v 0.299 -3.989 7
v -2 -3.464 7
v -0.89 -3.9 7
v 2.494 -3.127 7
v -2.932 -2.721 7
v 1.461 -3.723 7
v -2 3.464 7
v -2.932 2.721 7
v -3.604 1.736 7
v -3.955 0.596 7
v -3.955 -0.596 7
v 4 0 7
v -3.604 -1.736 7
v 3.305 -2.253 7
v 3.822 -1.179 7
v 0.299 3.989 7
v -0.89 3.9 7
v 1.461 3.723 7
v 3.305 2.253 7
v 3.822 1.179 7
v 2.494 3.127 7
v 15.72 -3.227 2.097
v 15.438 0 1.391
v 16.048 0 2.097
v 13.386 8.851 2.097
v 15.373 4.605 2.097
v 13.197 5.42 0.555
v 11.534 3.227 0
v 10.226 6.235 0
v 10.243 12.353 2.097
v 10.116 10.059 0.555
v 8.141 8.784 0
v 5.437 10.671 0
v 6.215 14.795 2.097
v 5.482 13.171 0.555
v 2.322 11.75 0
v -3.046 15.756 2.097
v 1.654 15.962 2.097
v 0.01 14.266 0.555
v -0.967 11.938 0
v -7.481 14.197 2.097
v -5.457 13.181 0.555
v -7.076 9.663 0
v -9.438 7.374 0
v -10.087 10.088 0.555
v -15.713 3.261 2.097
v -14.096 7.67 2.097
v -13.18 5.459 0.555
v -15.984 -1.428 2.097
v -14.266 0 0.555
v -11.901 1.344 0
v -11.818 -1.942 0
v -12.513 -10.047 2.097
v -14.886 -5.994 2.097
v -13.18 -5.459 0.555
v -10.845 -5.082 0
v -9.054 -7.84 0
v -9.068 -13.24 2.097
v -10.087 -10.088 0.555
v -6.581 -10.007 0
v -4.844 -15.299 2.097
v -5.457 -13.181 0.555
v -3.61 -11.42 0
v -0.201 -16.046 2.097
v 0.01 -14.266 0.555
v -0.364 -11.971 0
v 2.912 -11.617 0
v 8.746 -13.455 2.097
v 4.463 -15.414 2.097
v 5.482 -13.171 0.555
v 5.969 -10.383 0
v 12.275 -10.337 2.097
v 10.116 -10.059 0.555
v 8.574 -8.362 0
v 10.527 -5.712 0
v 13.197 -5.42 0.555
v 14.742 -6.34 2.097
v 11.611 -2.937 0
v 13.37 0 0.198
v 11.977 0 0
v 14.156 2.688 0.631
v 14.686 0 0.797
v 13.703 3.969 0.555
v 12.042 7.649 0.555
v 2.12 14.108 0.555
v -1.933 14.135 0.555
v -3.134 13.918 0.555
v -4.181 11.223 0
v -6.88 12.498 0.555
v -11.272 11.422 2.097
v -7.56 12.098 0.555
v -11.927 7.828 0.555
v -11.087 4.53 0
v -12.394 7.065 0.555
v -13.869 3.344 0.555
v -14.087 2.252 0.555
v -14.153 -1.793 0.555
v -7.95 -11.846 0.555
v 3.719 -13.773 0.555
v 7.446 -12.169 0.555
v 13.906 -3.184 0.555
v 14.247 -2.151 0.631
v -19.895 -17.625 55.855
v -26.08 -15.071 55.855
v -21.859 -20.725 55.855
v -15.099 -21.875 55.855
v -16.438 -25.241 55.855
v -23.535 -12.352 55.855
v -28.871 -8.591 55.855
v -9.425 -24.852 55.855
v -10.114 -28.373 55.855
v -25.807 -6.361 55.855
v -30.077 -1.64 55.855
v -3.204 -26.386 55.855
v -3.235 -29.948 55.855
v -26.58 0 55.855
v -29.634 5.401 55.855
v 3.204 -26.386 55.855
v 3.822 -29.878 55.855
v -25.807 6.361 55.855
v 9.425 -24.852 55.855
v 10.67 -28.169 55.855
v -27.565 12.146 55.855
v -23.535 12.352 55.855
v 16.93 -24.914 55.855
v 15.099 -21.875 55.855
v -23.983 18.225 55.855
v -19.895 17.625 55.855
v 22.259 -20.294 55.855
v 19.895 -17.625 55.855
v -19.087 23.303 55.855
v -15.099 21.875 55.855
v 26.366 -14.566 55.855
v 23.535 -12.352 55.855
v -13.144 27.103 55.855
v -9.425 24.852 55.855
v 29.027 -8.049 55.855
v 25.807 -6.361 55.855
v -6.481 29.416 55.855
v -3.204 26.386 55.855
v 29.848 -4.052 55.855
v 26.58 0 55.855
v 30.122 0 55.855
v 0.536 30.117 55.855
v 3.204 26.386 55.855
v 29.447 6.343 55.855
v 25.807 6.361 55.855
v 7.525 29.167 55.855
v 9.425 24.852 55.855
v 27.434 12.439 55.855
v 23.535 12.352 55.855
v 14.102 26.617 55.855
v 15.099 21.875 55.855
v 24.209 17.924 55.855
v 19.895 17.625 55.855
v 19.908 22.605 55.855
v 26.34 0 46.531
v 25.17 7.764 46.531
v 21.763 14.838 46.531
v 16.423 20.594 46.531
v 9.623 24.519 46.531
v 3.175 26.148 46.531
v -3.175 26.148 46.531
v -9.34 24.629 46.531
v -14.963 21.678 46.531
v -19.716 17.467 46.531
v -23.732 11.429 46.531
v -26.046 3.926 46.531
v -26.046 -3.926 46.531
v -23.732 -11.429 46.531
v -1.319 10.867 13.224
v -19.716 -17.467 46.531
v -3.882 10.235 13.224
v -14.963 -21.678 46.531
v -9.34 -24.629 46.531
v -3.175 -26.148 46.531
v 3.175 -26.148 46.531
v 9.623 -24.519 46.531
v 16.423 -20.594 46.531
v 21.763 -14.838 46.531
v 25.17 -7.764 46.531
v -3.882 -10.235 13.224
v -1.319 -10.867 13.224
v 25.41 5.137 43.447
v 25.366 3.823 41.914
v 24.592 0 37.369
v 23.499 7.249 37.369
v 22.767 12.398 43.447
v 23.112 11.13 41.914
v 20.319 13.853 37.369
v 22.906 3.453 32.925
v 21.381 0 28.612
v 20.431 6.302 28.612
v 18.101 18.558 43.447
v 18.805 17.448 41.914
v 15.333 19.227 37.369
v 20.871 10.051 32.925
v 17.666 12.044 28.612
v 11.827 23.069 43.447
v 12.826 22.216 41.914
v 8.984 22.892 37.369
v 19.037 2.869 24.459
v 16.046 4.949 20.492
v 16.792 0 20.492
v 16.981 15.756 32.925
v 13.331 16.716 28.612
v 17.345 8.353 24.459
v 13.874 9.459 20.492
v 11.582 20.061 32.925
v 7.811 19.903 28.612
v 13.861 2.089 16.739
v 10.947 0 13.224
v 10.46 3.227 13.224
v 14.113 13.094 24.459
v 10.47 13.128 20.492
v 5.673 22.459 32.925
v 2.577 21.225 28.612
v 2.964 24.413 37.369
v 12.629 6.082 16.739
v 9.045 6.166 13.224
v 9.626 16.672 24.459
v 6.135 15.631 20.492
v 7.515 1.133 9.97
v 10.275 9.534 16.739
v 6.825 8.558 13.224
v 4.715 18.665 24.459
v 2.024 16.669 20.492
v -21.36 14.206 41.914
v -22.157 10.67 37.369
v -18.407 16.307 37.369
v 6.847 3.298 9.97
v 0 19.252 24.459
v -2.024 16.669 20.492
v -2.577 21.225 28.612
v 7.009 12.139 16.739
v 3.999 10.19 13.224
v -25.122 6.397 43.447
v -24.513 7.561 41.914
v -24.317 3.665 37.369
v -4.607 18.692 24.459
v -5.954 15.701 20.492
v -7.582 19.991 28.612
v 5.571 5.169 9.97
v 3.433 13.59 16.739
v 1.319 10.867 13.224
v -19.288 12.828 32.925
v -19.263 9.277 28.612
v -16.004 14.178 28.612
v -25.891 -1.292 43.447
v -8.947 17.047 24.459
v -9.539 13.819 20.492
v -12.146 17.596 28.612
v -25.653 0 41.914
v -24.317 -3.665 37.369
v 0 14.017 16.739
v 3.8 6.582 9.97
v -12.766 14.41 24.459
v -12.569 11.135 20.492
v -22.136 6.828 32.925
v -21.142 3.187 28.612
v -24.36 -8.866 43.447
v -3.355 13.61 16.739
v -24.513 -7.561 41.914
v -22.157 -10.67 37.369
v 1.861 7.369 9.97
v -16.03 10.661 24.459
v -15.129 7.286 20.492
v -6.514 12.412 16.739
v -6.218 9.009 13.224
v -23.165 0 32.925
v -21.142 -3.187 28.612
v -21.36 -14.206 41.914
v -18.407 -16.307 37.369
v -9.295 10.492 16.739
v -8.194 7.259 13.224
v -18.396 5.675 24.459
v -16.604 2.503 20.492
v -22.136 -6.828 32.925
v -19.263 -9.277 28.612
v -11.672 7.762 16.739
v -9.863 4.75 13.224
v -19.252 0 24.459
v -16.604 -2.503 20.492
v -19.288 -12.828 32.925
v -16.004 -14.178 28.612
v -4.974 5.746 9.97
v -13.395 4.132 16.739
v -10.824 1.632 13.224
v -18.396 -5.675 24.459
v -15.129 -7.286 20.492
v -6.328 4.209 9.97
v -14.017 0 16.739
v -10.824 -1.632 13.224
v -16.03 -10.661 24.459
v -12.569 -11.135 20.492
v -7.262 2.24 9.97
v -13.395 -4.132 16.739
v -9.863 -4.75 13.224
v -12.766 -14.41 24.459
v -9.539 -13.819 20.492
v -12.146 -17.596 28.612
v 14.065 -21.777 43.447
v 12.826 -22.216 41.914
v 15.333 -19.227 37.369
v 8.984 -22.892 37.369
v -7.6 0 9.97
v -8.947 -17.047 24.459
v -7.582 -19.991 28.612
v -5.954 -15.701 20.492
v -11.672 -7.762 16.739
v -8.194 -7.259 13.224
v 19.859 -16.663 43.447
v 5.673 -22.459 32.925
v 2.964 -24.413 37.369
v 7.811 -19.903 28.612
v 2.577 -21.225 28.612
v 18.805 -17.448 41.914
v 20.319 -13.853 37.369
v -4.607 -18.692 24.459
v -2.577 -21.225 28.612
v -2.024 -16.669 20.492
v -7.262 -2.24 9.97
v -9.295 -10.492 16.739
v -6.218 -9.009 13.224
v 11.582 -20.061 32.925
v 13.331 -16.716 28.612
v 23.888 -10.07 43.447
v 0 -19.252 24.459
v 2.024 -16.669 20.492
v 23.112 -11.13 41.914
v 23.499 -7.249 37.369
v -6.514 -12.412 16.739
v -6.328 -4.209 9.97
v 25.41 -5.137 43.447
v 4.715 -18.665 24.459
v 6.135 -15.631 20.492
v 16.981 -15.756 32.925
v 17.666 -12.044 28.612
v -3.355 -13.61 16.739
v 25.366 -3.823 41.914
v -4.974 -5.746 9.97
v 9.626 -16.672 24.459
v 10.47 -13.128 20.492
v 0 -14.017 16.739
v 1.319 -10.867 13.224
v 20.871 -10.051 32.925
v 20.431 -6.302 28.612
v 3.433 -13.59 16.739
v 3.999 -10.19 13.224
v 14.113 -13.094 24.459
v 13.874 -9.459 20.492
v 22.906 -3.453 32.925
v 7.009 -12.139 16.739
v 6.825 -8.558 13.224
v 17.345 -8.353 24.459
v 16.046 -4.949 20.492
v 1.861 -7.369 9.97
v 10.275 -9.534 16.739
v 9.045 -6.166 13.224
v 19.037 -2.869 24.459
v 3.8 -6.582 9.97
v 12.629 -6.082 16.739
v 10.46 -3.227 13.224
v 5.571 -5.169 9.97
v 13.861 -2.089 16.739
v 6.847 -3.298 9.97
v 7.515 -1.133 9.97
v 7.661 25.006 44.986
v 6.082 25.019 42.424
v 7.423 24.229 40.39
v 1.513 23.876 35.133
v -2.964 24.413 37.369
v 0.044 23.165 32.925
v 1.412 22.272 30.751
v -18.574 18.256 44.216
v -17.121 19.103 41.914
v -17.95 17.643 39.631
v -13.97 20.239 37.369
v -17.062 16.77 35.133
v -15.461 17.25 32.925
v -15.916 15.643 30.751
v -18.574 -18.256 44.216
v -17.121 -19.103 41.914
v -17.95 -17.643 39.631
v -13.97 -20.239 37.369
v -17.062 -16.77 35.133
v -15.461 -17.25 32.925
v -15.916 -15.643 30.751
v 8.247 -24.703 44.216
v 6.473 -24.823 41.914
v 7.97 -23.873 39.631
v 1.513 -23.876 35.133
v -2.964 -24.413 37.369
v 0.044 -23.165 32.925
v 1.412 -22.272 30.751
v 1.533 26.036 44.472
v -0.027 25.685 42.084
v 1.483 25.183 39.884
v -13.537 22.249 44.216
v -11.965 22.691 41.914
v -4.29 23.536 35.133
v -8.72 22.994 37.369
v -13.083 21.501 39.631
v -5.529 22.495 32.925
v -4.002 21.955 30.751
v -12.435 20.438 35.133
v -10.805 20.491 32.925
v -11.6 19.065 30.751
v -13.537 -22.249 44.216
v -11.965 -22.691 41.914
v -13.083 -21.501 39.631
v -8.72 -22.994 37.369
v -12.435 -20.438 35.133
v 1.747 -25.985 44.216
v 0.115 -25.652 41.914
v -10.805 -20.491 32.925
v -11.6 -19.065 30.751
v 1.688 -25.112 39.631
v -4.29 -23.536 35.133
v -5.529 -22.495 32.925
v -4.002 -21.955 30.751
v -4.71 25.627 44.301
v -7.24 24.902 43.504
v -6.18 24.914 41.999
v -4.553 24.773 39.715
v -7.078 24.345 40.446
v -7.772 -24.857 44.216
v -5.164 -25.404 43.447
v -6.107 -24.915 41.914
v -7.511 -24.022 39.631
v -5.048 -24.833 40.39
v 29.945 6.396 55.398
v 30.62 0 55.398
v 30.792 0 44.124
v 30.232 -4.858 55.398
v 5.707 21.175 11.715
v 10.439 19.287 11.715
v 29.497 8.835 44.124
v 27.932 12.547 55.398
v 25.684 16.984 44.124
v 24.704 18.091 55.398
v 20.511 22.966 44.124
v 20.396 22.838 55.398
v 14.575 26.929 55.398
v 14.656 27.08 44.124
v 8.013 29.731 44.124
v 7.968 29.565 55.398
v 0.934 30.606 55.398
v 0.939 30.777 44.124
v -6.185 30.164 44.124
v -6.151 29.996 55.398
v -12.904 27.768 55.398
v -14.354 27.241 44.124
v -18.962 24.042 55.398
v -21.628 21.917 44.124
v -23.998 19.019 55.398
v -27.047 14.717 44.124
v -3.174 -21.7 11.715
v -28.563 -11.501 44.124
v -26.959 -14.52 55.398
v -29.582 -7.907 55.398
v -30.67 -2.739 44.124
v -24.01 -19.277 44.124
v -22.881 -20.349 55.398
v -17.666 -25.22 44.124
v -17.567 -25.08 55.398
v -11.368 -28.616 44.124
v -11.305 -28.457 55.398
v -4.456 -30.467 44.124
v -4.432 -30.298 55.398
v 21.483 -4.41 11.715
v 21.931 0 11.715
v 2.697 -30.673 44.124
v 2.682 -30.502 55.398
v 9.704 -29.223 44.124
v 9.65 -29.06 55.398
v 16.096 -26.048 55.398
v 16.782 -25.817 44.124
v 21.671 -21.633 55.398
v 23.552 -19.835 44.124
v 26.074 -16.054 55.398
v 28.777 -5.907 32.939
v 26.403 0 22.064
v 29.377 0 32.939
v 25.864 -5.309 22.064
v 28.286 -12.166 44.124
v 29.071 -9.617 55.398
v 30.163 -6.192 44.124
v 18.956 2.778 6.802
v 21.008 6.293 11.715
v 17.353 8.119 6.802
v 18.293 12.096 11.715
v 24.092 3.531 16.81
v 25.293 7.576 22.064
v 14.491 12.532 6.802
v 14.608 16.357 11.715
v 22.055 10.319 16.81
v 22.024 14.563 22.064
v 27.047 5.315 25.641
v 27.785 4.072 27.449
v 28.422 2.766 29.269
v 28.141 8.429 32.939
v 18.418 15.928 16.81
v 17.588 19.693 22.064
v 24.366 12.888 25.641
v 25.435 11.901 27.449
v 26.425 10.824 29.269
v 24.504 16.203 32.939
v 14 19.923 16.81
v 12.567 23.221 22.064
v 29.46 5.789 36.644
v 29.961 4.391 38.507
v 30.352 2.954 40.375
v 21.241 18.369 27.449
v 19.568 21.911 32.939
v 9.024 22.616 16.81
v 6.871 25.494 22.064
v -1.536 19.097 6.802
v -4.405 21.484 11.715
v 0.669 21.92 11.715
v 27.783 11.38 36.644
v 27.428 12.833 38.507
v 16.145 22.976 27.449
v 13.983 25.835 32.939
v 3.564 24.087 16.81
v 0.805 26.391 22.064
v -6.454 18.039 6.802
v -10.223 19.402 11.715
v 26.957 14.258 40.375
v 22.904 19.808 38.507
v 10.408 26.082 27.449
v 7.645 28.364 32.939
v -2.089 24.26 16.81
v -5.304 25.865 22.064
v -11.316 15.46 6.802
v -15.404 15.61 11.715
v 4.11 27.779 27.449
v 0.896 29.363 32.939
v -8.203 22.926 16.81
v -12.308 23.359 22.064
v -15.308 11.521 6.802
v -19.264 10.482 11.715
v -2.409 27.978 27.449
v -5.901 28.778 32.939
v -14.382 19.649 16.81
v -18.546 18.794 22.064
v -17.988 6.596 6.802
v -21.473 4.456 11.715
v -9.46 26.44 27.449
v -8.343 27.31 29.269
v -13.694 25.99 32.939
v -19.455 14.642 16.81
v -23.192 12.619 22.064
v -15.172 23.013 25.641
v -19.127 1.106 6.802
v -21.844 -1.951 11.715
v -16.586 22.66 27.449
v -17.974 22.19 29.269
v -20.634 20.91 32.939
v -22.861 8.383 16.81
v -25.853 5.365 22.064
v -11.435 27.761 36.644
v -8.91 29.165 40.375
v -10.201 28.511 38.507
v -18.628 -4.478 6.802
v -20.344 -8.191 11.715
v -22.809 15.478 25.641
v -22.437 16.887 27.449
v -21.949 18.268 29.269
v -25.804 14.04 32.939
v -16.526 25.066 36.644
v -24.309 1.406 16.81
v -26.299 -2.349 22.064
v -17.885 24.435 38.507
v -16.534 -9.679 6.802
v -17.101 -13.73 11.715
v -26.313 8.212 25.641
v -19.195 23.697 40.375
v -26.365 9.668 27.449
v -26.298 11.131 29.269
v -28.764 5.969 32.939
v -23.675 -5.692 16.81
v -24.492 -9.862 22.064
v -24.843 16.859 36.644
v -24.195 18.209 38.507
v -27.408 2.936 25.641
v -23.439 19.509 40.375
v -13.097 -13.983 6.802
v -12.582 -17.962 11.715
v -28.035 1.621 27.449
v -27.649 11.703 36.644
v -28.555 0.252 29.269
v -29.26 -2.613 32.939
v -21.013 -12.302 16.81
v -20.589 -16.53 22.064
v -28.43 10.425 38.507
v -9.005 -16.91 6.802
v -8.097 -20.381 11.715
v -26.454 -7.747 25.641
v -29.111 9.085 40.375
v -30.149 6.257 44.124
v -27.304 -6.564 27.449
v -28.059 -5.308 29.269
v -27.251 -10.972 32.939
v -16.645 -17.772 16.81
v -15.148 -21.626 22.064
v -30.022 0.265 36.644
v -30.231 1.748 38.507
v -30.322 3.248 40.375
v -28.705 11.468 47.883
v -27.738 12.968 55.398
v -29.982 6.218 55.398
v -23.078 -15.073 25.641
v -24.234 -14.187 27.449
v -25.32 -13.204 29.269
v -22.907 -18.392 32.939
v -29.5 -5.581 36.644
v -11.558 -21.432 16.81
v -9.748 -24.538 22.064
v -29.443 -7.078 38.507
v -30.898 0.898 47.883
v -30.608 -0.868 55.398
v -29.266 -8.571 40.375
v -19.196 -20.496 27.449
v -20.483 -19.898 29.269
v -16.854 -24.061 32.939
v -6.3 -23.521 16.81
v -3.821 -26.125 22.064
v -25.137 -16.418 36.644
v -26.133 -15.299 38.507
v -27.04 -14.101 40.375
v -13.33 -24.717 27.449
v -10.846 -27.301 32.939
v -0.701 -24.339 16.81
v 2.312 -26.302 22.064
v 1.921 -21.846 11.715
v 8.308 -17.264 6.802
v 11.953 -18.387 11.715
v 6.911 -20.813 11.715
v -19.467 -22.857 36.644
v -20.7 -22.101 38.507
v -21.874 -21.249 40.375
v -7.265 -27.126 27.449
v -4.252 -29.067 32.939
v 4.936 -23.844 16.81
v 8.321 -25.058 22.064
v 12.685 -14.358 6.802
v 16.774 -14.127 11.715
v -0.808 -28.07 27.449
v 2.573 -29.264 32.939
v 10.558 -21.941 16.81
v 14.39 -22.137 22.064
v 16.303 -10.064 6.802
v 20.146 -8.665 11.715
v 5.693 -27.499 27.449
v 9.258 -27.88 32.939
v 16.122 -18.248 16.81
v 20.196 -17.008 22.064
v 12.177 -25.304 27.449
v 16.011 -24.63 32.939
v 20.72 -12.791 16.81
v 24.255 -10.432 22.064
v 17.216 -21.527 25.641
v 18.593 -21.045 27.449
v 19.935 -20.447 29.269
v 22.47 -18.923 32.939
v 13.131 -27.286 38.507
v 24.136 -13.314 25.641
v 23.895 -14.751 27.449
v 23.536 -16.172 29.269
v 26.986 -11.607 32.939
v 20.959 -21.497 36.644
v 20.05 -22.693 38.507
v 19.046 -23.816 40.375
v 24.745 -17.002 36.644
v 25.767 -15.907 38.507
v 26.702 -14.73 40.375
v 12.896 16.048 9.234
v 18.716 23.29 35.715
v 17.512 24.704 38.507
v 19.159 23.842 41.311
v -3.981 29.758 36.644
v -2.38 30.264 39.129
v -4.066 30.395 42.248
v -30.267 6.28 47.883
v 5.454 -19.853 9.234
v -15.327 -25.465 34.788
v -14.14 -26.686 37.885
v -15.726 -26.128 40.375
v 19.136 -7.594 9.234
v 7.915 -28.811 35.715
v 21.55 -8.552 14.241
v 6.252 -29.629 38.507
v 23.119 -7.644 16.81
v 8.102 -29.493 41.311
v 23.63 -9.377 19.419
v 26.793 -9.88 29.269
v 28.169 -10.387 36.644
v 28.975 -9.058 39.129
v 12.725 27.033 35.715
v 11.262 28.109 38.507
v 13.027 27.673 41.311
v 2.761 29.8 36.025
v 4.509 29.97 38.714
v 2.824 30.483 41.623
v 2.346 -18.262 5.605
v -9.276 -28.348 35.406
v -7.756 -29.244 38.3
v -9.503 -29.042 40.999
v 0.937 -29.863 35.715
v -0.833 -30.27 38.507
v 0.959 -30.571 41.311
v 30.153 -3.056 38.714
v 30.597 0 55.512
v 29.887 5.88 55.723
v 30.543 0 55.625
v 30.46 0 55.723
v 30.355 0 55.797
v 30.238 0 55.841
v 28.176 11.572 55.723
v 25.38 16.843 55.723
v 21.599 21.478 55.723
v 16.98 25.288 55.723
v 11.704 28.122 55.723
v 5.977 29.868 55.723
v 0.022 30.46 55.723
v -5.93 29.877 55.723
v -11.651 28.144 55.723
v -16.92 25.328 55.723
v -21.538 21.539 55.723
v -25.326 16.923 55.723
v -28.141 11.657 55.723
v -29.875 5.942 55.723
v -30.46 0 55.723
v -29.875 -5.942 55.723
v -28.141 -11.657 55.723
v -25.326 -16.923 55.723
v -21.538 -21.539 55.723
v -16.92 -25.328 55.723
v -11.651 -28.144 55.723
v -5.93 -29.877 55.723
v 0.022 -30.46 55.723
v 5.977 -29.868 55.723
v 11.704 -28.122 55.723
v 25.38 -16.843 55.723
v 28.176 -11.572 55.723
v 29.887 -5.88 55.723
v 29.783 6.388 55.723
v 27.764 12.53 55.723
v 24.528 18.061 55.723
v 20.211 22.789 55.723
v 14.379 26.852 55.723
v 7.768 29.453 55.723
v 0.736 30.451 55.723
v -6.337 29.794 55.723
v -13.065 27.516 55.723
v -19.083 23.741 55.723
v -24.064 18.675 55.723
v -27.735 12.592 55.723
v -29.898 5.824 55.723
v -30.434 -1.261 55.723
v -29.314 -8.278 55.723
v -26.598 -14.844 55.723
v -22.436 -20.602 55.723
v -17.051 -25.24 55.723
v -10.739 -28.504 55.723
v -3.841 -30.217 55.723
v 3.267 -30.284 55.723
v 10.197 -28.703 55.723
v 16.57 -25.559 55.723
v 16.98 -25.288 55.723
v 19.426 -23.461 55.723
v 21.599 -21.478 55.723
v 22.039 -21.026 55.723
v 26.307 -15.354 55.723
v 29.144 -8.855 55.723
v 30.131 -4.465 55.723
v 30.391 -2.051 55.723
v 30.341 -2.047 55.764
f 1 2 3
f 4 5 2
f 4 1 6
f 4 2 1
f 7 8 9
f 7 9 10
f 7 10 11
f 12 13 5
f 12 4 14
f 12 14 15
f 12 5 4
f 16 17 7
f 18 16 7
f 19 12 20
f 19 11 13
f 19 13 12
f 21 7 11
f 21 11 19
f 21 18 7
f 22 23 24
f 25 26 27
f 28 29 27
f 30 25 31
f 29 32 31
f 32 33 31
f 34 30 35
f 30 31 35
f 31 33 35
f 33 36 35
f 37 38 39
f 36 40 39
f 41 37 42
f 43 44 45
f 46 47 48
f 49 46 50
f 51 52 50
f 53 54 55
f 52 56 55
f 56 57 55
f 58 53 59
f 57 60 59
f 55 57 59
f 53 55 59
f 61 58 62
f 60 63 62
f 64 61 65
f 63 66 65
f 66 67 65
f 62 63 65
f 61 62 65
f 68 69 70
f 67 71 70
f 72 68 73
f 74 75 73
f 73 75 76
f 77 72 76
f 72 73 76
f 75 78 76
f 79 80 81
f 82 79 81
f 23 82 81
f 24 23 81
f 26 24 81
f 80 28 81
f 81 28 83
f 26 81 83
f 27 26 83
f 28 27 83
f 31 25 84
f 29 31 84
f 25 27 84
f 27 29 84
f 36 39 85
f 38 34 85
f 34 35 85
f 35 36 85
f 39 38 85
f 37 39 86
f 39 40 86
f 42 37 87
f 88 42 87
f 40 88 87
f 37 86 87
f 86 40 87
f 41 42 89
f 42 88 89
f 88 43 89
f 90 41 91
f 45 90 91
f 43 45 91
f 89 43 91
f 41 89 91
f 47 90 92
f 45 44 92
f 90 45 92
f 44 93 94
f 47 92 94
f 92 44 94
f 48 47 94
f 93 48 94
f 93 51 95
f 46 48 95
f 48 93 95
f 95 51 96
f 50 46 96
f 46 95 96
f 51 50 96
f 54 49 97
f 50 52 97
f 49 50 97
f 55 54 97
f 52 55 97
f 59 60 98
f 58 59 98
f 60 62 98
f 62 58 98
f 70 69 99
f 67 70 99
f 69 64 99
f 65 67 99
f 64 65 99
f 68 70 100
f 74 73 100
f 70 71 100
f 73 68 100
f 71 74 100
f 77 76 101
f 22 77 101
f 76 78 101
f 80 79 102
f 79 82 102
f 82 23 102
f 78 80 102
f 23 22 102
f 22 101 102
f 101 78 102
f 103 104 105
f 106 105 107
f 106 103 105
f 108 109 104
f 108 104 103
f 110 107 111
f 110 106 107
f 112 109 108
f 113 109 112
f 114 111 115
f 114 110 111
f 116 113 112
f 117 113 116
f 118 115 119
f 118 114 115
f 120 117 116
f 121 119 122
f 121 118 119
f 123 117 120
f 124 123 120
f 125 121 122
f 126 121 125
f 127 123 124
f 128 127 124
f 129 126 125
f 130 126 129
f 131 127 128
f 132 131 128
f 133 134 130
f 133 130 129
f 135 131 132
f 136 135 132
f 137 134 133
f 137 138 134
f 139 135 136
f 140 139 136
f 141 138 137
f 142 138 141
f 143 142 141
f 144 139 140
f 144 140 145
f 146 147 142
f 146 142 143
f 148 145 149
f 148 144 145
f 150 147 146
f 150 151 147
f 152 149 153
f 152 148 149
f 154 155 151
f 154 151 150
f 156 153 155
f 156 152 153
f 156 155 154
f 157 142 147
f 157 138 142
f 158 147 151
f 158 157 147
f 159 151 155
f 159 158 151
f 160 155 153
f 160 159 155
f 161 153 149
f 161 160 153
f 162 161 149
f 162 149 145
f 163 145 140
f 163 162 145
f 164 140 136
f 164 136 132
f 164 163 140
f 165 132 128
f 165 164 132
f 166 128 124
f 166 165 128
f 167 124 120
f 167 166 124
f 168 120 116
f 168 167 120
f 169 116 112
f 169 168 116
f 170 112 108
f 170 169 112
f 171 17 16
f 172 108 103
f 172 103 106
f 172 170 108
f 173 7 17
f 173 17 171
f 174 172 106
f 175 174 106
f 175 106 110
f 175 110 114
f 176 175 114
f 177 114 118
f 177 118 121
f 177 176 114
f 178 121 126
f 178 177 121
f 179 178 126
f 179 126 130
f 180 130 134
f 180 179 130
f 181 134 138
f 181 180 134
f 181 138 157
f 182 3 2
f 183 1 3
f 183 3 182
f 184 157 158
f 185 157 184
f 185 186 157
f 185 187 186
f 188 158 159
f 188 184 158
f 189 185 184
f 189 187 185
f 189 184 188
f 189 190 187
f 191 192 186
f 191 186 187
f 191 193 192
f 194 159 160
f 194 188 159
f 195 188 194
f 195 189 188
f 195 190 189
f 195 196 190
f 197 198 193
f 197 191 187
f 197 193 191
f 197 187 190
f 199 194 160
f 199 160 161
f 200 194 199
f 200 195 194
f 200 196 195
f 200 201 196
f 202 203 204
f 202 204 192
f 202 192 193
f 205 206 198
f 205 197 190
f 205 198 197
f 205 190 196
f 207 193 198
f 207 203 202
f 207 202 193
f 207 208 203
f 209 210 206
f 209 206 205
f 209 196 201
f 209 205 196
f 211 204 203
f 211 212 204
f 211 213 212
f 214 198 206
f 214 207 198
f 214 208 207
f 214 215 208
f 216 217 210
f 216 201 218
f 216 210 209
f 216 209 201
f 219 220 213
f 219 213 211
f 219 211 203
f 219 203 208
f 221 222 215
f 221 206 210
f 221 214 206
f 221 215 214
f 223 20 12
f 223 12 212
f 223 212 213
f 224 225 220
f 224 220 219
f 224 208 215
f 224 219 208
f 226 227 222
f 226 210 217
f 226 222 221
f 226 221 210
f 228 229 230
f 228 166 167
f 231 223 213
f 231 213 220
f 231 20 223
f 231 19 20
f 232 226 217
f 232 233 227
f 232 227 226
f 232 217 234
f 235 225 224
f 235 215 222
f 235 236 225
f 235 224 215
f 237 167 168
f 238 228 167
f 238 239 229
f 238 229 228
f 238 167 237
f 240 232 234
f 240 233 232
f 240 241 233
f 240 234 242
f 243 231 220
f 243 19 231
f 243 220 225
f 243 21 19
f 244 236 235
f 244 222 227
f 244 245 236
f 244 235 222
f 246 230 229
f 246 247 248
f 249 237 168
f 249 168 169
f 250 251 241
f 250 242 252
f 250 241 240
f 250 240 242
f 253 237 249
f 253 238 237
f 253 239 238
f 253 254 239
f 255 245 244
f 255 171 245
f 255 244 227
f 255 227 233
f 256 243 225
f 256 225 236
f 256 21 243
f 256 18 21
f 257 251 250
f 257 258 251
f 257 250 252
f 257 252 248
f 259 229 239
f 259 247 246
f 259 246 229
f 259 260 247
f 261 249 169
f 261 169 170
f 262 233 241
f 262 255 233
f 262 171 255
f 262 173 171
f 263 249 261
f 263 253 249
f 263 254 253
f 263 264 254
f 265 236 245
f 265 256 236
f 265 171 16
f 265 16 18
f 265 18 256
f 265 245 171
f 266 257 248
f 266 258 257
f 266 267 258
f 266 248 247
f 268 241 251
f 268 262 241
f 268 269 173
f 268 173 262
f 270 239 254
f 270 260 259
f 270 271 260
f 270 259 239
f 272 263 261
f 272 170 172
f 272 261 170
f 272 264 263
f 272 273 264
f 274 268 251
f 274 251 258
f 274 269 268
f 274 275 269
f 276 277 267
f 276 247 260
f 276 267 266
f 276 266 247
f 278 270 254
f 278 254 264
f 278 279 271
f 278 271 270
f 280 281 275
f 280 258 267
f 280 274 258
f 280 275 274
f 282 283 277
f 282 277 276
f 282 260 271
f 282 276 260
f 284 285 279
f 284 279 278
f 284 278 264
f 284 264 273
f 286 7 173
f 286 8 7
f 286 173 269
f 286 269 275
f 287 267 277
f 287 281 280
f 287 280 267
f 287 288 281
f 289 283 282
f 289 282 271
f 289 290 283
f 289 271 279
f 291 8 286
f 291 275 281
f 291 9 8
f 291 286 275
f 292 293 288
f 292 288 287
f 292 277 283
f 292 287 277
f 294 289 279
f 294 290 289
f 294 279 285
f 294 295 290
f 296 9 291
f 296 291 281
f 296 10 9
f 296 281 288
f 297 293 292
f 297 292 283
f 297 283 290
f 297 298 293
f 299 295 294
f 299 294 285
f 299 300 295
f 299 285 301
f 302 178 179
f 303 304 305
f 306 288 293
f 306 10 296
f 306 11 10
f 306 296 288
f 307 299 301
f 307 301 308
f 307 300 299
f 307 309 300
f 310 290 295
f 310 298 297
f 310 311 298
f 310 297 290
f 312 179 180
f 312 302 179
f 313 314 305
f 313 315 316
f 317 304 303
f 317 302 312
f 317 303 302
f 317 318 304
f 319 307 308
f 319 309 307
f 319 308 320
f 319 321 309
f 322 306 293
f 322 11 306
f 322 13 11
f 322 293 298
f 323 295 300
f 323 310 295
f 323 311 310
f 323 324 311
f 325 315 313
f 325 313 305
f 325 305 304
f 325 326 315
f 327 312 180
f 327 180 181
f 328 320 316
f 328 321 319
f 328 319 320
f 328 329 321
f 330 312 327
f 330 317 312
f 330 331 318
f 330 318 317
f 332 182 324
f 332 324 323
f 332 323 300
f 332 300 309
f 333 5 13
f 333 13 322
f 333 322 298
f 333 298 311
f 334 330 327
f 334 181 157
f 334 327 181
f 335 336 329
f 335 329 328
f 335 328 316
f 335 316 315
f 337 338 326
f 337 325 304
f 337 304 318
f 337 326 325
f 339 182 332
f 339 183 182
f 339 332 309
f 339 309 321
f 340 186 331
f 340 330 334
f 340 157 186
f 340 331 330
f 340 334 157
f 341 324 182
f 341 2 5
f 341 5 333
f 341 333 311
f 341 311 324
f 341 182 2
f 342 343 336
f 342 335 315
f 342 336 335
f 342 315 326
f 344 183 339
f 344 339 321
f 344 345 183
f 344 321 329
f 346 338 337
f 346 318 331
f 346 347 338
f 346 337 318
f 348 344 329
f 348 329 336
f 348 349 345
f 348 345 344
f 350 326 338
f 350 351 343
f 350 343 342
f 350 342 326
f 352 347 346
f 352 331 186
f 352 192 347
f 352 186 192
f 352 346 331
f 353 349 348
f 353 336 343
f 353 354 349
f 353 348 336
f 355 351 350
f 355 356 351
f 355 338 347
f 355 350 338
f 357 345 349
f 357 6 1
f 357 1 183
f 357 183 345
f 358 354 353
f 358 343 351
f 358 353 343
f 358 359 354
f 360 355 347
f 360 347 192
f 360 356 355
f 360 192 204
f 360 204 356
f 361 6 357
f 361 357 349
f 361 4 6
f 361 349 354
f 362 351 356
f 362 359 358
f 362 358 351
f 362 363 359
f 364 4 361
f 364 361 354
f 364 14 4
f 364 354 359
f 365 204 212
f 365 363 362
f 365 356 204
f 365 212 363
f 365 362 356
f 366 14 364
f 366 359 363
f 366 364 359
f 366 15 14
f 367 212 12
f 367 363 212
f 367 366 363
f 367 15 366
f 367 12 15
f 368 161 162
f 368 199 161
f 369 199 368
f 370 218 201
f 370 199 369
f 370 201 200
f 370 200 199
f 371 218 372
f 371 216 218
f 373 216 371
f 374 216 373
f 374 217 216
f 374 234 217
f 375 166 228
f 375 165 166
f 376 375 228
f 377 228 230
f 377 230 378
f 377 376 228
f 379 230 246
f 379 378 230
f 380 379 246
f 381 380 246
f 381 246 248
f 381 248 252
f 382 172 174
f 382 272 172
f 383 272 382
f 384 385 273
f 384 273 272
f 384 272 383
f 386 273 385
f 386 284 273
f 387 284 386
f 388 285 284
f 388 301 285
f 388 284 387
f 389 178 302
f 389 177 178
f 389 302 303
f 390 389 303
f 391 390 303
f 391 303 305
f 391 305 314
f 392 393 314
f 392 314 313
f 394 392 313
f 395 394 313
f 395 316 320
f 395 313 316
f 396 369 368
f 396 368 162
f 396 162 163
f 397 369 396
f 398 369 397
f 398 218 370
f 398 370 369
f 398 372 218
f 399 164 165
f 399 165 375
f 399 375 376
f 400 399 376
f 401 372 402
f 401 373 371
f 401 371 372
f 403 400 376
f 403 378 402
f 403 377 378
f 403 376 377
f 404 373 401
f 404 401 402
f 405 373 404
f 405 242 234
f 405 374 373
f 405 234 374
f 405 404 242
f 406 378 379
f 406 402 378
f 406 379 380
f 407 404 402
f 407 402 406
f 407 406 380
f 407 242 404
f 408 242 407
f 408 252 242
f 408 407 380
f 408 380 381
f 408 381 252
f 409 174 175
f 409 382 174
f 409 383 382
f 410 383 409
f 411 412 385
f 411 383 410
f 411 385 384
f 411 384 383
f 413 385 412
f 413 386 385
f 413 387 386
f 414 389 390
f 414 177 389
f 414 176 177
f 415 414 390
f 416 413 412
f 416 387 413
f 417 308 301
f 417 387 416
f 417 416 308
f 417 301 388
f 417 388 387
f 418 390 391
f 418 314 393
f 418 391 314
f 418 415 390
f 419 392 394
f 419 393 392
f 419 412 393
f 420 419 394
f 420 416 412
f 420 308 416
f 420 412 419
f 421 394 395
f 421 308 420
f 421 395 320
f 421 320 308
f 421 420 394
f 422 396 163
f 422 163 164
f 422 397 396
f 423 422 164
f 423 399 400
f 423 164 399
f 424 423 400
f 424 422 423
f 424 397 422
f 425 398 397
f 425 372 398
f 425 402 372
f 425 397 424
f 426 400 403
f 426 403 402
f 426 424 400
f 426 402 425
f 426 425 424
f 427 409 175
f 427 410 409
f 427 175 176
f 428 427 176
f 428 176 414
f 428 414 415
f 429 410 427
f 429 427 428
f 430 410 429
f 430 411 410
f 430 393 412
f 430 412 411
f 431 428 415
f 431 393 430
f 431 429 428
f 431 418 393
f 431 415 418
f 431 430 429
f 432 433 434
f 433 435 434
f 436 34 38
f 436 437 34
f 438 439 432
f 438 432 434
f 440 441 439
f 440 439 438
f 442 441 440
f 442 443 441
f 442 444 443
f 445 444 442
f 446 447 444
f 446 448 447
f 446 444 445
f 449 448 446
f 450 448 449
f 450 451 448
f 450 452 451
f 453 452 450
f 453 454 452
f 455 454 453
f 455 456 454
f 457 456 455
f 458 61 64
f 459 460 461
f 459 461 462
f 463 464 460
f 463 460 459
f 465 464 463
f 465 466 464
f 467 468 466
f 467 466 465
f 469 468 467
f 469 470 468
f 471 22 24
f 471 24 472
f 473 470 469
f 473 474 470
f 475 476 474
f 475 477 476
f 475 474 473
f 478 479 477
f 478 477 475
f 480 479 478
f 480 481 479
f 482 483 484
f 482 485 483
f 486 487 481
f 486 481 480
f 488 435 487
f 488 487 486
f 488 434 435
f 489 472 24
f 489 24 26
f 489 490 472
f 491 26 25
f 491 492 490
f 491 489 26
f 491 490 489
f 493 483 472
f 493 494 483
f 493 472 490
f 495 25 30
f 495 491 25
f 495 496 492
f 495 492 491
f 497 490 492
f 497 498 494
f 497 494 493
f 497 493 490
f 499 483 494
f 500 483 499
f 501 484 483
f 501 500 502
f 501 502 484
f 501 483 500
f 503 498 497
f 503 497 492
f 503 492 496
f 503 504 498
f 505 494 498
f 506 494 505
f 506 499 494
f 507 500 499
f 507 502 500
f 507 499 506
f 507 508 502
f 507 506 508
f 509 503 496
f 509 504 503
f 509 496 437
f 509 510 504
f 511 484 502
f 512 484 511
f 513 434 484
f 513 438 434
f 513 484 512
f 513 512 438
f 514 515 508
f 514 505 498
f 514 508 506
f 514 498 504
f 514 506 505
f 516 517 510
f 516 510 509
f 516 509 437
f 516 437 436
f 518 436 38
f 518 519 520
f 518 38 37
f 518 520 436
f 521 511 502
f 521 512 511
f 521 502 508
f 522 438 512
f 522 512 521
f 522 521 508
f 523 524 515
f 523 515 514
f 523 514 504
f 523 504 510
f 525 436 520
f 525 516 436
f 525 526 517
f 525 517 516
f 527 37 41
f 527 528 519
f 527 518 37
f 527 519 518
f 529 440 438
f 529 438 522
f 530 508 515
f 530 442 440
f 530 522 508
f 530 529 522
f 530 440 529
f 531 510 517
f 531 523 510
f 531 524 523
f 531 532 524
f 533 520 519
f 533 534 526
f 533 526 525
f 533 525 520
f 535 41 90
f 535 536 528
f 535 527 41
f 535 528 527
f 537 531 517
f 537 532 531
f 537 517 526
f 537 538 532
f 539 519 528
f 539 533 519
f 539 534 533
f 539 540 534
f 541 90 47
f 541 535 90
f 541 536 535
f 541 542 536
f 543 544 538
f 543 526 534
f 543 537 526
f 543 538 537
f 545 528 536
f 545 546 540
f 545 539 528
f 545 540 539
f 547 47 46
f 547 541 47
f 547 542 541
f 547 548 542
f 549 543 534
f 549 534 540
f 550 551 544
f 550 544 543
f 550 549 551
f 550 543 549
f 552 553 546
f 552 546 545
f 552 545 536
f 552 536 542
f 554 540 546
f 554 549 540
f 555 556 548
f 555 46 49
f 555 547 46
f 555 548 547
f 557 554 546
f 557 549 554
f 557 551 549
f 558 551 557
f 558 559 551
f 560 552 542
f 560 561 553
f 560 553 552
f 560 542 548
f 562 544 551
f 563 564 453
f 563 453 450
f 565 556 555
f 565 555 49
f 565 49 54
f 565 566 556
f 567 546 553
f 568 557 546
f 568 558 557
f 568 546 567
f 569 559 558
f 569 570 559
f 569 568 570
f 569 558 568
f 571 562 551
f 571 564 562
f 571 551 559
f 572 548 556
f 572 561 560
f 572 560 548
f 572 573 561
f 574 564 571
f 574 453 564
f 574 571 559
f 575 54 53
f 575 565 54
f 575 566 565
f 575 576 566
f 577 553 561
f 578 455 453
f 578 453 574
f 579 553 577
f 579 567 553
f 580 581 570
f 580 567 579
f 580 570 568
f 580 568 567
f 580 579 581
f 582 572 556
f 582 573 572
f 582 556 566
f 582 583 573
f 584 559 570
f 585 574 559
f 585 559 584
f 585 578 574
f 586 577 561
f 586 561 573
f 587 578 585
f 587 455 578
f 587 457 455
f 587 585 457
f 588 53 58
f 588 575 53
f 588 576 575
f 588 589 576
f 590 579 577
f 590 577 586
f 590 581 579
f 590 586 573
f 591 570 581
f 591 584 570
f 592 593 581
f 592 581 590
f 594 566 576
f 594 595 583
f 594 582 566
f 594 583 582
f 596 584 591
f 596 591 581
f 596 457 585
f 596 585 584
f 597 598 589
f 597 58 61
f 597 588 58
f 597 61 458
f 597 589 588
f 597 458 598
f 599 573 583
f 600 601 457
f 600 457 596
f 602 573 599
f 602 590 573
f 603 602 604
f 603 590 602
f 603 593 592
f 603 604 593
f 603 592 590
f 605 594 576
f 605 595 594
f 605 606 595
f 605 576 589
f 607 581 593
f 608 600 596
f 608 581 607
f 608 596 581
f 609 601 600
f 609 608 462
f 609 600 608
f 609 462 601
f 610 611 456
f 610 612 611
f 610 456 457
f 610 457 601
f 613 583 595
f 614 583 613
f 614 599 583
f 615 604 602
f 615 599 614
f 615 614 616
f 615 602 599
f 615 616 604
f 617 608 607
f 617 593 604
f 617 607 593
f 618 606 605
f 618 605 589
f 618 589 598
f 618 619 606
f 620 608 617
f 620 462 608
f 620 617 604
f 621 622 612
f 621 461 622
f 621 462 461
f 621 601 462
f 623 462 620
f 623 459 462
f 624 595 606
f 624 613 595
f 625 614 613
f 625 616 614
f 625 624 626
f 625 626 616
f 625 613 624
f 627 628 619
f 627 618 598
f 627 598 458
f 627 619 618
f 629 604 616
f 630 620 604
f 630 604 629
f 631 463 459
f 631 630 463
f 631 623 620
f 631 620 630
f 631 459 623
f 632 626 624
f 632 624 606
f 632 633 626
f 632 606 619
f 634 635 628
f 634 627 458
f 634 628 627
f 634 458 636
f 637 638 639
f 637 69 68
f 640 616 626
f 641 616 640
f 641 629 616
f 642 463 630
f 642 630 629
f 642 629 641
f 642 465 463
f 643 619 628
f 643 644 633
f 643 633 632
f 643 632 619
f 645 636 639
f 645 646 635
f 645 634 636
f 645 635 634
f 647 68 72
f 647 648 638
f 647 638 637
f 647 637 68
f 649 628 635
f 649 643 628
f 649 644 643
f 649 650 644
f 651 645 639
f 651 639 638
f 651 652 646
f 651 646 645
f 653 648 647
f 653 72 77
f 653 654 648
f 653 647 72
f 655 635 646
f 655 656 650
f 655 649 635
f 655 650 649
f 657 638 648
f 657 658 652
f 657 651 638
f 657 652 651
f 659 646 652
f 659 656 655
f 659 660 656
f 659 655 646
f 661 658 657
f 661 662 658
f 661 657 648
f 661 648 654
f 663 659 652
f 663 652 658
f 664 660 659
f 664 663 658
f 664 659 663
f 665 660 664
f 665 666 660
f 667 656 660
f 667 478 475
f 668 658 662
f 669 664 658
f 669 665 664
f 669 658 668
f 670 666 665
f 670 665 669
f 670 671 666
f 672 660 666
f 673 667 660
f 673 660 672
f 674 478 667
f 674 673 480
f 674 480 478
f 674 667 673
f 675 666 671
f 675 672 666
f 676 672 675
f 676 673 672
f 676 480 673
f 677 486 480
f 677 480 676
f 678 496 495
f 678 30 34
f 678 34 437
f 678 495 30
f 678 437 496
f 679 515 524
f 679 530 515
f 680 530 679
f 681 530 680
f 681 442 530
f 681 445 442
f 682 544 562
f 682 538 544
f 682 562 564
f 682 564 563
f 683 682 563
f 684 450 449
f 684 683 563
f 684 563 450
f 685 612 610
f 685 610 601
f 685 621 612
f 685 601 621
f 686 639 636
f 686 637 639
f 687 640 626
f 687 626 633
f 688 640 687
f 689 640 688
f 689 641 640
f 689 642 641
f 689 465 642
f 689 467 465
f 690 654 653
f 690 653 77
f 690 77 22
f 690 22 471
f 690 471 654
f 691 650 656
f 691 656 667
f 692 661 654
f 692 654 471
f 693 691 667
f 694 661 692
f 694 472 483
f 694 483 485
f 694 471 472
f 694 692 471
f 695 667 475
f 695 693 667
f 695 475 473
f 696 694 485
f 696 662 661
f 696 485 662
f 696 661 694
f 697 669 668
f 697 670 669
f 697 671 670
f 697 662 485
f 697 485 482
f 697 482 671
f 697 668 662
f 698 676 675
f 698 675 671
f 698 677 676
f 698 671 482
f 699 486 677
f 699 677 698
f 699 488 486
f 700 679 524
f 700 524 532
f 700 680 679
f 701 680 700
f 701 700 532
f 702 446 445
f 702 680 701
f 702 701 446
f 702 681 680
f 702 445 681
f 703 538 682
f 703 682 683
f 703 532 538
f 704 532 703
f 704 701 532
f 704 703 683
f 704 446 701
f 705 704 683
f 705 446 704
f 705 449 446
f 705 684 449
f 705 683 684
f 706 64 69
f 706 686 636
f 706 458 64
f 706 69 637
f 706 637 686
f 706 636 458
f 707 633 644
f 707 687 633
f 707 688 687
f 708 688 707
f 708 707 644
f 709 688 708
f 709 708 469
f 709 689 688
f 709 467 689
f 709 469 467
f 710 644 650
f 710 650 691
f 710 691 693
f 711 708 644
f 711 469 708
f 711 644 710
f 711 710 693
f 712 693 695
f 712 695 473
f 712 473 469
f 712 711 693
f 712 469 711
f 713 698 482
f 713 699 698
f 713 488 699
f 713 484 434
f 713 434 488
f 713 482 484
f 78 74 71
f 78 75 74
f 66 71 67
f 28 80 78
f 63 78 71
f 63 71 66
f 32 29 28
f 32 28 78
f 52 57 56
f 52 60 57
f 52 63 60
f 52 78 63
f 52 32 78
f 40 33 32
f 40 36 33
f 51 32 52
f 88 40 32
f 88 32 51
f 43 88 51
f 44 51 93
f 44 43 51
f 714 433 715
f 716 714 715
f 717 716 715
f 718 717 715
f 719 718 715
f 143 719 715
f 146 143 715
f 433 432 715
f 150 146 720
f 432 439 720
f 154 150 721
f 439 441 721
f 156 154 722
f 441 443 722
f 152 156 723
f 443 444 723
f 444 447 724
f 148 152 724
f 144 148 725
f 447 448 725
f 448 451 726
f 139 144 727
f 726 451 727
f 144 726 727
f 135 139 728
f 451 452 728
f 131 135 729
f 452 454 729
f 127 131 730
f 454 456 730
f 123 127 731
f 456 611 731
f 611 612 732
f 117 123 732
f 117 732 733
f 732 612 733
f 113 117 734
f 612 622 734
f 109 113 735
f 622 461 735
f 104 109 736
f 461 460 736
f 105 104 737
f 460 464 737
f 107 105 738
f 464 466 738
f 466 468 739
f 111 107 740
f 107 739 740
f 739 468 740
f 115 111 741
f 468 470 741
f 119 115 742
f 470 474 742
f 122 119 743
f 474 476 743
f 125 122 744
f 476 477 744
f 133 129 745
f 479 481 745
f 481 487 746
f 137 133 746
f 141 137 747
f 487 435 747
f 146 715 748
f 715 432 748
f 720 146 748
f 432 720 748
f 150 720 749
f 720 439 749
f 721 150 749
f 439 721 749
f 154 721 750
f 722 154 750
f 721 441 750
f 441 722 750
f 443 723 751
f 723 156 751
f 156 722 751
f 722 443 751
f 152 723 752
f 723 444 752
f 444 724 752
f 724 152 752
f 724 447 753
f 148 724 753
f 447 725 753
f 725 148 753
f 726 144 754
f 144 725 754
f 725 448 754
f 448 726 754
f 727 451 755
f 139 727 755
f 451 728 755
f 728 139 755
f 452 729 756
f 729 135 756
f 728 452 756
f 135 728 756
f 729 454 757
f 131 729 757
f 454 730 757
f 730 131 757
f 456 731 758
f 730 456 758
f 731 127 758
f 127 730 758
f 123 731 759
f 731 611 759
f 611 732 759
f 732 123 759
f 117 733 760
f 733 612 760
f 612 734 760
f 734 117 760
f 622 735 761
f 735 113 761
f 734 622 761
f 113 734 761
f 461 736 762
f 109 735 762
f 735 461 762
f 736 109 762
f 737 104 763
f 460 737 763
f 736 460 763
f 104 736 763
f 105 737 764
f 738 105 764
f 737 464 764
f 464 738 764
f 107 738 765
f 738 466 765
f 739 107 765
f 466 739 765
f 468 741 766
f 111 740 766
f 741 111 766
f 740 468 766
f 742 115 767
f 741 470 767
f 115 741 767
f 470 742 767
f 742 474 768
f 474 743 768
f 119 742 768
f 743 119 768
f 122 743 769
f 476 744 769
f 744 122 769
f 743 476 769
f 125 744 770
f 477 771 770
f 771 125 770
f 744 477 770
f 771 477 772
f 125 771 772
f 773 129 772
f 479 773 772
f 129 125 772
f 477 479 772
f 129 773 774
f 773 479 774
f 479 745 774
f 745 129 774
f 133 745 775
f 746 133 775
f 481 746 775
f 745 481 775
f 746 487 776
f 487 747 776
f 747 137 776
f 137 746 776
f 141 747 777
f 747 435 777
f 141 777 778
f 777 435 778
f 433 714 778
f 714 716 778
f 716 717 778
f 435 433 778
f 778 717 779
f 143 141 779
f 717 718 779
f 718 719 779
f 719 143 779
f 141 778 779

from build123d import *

# Parameters (mm, degrees)
F2_R = 5
F3_R = 0.5


with BuildPart() as f1:
    # F0 (on Front) → F1 (revolve)
    with BuildSketch(Plane.XZ):
        with BuildLine():
            Line((0, 7), (0, 0))
            Line((0, 0), (14.5, 0))
            ThreePointArc((14.5, 0), (27.791732, 26.415419), (30.579505, 55.854727))
            Line((30.579505, 55.854727), (26.579505, 55.854727))
            ThreePointArc((26.579505, 55.854727), (21.380725, 28.612259), (4, 7))
            Line((4, 7), (0, 7))
        make_face()
    revolve(axis=Axis((0, 0, 3.5), (0, 0, 1)))

    # F2
    f2_edges = [f1.edges().sort_by_distance(p)[0] for p in [
        (-14.5, 0, 0),
    ]]
    fillet(f2_edges, radius=F2_R)

    # F3
    f3_edges = [f1.edges().sort_by_distance(p)[0] for p in [
        (-30.579505, 0, 55.854727),
    ]]
    fillet(f3_edges, radius=F3_R)


solid = f1.part
